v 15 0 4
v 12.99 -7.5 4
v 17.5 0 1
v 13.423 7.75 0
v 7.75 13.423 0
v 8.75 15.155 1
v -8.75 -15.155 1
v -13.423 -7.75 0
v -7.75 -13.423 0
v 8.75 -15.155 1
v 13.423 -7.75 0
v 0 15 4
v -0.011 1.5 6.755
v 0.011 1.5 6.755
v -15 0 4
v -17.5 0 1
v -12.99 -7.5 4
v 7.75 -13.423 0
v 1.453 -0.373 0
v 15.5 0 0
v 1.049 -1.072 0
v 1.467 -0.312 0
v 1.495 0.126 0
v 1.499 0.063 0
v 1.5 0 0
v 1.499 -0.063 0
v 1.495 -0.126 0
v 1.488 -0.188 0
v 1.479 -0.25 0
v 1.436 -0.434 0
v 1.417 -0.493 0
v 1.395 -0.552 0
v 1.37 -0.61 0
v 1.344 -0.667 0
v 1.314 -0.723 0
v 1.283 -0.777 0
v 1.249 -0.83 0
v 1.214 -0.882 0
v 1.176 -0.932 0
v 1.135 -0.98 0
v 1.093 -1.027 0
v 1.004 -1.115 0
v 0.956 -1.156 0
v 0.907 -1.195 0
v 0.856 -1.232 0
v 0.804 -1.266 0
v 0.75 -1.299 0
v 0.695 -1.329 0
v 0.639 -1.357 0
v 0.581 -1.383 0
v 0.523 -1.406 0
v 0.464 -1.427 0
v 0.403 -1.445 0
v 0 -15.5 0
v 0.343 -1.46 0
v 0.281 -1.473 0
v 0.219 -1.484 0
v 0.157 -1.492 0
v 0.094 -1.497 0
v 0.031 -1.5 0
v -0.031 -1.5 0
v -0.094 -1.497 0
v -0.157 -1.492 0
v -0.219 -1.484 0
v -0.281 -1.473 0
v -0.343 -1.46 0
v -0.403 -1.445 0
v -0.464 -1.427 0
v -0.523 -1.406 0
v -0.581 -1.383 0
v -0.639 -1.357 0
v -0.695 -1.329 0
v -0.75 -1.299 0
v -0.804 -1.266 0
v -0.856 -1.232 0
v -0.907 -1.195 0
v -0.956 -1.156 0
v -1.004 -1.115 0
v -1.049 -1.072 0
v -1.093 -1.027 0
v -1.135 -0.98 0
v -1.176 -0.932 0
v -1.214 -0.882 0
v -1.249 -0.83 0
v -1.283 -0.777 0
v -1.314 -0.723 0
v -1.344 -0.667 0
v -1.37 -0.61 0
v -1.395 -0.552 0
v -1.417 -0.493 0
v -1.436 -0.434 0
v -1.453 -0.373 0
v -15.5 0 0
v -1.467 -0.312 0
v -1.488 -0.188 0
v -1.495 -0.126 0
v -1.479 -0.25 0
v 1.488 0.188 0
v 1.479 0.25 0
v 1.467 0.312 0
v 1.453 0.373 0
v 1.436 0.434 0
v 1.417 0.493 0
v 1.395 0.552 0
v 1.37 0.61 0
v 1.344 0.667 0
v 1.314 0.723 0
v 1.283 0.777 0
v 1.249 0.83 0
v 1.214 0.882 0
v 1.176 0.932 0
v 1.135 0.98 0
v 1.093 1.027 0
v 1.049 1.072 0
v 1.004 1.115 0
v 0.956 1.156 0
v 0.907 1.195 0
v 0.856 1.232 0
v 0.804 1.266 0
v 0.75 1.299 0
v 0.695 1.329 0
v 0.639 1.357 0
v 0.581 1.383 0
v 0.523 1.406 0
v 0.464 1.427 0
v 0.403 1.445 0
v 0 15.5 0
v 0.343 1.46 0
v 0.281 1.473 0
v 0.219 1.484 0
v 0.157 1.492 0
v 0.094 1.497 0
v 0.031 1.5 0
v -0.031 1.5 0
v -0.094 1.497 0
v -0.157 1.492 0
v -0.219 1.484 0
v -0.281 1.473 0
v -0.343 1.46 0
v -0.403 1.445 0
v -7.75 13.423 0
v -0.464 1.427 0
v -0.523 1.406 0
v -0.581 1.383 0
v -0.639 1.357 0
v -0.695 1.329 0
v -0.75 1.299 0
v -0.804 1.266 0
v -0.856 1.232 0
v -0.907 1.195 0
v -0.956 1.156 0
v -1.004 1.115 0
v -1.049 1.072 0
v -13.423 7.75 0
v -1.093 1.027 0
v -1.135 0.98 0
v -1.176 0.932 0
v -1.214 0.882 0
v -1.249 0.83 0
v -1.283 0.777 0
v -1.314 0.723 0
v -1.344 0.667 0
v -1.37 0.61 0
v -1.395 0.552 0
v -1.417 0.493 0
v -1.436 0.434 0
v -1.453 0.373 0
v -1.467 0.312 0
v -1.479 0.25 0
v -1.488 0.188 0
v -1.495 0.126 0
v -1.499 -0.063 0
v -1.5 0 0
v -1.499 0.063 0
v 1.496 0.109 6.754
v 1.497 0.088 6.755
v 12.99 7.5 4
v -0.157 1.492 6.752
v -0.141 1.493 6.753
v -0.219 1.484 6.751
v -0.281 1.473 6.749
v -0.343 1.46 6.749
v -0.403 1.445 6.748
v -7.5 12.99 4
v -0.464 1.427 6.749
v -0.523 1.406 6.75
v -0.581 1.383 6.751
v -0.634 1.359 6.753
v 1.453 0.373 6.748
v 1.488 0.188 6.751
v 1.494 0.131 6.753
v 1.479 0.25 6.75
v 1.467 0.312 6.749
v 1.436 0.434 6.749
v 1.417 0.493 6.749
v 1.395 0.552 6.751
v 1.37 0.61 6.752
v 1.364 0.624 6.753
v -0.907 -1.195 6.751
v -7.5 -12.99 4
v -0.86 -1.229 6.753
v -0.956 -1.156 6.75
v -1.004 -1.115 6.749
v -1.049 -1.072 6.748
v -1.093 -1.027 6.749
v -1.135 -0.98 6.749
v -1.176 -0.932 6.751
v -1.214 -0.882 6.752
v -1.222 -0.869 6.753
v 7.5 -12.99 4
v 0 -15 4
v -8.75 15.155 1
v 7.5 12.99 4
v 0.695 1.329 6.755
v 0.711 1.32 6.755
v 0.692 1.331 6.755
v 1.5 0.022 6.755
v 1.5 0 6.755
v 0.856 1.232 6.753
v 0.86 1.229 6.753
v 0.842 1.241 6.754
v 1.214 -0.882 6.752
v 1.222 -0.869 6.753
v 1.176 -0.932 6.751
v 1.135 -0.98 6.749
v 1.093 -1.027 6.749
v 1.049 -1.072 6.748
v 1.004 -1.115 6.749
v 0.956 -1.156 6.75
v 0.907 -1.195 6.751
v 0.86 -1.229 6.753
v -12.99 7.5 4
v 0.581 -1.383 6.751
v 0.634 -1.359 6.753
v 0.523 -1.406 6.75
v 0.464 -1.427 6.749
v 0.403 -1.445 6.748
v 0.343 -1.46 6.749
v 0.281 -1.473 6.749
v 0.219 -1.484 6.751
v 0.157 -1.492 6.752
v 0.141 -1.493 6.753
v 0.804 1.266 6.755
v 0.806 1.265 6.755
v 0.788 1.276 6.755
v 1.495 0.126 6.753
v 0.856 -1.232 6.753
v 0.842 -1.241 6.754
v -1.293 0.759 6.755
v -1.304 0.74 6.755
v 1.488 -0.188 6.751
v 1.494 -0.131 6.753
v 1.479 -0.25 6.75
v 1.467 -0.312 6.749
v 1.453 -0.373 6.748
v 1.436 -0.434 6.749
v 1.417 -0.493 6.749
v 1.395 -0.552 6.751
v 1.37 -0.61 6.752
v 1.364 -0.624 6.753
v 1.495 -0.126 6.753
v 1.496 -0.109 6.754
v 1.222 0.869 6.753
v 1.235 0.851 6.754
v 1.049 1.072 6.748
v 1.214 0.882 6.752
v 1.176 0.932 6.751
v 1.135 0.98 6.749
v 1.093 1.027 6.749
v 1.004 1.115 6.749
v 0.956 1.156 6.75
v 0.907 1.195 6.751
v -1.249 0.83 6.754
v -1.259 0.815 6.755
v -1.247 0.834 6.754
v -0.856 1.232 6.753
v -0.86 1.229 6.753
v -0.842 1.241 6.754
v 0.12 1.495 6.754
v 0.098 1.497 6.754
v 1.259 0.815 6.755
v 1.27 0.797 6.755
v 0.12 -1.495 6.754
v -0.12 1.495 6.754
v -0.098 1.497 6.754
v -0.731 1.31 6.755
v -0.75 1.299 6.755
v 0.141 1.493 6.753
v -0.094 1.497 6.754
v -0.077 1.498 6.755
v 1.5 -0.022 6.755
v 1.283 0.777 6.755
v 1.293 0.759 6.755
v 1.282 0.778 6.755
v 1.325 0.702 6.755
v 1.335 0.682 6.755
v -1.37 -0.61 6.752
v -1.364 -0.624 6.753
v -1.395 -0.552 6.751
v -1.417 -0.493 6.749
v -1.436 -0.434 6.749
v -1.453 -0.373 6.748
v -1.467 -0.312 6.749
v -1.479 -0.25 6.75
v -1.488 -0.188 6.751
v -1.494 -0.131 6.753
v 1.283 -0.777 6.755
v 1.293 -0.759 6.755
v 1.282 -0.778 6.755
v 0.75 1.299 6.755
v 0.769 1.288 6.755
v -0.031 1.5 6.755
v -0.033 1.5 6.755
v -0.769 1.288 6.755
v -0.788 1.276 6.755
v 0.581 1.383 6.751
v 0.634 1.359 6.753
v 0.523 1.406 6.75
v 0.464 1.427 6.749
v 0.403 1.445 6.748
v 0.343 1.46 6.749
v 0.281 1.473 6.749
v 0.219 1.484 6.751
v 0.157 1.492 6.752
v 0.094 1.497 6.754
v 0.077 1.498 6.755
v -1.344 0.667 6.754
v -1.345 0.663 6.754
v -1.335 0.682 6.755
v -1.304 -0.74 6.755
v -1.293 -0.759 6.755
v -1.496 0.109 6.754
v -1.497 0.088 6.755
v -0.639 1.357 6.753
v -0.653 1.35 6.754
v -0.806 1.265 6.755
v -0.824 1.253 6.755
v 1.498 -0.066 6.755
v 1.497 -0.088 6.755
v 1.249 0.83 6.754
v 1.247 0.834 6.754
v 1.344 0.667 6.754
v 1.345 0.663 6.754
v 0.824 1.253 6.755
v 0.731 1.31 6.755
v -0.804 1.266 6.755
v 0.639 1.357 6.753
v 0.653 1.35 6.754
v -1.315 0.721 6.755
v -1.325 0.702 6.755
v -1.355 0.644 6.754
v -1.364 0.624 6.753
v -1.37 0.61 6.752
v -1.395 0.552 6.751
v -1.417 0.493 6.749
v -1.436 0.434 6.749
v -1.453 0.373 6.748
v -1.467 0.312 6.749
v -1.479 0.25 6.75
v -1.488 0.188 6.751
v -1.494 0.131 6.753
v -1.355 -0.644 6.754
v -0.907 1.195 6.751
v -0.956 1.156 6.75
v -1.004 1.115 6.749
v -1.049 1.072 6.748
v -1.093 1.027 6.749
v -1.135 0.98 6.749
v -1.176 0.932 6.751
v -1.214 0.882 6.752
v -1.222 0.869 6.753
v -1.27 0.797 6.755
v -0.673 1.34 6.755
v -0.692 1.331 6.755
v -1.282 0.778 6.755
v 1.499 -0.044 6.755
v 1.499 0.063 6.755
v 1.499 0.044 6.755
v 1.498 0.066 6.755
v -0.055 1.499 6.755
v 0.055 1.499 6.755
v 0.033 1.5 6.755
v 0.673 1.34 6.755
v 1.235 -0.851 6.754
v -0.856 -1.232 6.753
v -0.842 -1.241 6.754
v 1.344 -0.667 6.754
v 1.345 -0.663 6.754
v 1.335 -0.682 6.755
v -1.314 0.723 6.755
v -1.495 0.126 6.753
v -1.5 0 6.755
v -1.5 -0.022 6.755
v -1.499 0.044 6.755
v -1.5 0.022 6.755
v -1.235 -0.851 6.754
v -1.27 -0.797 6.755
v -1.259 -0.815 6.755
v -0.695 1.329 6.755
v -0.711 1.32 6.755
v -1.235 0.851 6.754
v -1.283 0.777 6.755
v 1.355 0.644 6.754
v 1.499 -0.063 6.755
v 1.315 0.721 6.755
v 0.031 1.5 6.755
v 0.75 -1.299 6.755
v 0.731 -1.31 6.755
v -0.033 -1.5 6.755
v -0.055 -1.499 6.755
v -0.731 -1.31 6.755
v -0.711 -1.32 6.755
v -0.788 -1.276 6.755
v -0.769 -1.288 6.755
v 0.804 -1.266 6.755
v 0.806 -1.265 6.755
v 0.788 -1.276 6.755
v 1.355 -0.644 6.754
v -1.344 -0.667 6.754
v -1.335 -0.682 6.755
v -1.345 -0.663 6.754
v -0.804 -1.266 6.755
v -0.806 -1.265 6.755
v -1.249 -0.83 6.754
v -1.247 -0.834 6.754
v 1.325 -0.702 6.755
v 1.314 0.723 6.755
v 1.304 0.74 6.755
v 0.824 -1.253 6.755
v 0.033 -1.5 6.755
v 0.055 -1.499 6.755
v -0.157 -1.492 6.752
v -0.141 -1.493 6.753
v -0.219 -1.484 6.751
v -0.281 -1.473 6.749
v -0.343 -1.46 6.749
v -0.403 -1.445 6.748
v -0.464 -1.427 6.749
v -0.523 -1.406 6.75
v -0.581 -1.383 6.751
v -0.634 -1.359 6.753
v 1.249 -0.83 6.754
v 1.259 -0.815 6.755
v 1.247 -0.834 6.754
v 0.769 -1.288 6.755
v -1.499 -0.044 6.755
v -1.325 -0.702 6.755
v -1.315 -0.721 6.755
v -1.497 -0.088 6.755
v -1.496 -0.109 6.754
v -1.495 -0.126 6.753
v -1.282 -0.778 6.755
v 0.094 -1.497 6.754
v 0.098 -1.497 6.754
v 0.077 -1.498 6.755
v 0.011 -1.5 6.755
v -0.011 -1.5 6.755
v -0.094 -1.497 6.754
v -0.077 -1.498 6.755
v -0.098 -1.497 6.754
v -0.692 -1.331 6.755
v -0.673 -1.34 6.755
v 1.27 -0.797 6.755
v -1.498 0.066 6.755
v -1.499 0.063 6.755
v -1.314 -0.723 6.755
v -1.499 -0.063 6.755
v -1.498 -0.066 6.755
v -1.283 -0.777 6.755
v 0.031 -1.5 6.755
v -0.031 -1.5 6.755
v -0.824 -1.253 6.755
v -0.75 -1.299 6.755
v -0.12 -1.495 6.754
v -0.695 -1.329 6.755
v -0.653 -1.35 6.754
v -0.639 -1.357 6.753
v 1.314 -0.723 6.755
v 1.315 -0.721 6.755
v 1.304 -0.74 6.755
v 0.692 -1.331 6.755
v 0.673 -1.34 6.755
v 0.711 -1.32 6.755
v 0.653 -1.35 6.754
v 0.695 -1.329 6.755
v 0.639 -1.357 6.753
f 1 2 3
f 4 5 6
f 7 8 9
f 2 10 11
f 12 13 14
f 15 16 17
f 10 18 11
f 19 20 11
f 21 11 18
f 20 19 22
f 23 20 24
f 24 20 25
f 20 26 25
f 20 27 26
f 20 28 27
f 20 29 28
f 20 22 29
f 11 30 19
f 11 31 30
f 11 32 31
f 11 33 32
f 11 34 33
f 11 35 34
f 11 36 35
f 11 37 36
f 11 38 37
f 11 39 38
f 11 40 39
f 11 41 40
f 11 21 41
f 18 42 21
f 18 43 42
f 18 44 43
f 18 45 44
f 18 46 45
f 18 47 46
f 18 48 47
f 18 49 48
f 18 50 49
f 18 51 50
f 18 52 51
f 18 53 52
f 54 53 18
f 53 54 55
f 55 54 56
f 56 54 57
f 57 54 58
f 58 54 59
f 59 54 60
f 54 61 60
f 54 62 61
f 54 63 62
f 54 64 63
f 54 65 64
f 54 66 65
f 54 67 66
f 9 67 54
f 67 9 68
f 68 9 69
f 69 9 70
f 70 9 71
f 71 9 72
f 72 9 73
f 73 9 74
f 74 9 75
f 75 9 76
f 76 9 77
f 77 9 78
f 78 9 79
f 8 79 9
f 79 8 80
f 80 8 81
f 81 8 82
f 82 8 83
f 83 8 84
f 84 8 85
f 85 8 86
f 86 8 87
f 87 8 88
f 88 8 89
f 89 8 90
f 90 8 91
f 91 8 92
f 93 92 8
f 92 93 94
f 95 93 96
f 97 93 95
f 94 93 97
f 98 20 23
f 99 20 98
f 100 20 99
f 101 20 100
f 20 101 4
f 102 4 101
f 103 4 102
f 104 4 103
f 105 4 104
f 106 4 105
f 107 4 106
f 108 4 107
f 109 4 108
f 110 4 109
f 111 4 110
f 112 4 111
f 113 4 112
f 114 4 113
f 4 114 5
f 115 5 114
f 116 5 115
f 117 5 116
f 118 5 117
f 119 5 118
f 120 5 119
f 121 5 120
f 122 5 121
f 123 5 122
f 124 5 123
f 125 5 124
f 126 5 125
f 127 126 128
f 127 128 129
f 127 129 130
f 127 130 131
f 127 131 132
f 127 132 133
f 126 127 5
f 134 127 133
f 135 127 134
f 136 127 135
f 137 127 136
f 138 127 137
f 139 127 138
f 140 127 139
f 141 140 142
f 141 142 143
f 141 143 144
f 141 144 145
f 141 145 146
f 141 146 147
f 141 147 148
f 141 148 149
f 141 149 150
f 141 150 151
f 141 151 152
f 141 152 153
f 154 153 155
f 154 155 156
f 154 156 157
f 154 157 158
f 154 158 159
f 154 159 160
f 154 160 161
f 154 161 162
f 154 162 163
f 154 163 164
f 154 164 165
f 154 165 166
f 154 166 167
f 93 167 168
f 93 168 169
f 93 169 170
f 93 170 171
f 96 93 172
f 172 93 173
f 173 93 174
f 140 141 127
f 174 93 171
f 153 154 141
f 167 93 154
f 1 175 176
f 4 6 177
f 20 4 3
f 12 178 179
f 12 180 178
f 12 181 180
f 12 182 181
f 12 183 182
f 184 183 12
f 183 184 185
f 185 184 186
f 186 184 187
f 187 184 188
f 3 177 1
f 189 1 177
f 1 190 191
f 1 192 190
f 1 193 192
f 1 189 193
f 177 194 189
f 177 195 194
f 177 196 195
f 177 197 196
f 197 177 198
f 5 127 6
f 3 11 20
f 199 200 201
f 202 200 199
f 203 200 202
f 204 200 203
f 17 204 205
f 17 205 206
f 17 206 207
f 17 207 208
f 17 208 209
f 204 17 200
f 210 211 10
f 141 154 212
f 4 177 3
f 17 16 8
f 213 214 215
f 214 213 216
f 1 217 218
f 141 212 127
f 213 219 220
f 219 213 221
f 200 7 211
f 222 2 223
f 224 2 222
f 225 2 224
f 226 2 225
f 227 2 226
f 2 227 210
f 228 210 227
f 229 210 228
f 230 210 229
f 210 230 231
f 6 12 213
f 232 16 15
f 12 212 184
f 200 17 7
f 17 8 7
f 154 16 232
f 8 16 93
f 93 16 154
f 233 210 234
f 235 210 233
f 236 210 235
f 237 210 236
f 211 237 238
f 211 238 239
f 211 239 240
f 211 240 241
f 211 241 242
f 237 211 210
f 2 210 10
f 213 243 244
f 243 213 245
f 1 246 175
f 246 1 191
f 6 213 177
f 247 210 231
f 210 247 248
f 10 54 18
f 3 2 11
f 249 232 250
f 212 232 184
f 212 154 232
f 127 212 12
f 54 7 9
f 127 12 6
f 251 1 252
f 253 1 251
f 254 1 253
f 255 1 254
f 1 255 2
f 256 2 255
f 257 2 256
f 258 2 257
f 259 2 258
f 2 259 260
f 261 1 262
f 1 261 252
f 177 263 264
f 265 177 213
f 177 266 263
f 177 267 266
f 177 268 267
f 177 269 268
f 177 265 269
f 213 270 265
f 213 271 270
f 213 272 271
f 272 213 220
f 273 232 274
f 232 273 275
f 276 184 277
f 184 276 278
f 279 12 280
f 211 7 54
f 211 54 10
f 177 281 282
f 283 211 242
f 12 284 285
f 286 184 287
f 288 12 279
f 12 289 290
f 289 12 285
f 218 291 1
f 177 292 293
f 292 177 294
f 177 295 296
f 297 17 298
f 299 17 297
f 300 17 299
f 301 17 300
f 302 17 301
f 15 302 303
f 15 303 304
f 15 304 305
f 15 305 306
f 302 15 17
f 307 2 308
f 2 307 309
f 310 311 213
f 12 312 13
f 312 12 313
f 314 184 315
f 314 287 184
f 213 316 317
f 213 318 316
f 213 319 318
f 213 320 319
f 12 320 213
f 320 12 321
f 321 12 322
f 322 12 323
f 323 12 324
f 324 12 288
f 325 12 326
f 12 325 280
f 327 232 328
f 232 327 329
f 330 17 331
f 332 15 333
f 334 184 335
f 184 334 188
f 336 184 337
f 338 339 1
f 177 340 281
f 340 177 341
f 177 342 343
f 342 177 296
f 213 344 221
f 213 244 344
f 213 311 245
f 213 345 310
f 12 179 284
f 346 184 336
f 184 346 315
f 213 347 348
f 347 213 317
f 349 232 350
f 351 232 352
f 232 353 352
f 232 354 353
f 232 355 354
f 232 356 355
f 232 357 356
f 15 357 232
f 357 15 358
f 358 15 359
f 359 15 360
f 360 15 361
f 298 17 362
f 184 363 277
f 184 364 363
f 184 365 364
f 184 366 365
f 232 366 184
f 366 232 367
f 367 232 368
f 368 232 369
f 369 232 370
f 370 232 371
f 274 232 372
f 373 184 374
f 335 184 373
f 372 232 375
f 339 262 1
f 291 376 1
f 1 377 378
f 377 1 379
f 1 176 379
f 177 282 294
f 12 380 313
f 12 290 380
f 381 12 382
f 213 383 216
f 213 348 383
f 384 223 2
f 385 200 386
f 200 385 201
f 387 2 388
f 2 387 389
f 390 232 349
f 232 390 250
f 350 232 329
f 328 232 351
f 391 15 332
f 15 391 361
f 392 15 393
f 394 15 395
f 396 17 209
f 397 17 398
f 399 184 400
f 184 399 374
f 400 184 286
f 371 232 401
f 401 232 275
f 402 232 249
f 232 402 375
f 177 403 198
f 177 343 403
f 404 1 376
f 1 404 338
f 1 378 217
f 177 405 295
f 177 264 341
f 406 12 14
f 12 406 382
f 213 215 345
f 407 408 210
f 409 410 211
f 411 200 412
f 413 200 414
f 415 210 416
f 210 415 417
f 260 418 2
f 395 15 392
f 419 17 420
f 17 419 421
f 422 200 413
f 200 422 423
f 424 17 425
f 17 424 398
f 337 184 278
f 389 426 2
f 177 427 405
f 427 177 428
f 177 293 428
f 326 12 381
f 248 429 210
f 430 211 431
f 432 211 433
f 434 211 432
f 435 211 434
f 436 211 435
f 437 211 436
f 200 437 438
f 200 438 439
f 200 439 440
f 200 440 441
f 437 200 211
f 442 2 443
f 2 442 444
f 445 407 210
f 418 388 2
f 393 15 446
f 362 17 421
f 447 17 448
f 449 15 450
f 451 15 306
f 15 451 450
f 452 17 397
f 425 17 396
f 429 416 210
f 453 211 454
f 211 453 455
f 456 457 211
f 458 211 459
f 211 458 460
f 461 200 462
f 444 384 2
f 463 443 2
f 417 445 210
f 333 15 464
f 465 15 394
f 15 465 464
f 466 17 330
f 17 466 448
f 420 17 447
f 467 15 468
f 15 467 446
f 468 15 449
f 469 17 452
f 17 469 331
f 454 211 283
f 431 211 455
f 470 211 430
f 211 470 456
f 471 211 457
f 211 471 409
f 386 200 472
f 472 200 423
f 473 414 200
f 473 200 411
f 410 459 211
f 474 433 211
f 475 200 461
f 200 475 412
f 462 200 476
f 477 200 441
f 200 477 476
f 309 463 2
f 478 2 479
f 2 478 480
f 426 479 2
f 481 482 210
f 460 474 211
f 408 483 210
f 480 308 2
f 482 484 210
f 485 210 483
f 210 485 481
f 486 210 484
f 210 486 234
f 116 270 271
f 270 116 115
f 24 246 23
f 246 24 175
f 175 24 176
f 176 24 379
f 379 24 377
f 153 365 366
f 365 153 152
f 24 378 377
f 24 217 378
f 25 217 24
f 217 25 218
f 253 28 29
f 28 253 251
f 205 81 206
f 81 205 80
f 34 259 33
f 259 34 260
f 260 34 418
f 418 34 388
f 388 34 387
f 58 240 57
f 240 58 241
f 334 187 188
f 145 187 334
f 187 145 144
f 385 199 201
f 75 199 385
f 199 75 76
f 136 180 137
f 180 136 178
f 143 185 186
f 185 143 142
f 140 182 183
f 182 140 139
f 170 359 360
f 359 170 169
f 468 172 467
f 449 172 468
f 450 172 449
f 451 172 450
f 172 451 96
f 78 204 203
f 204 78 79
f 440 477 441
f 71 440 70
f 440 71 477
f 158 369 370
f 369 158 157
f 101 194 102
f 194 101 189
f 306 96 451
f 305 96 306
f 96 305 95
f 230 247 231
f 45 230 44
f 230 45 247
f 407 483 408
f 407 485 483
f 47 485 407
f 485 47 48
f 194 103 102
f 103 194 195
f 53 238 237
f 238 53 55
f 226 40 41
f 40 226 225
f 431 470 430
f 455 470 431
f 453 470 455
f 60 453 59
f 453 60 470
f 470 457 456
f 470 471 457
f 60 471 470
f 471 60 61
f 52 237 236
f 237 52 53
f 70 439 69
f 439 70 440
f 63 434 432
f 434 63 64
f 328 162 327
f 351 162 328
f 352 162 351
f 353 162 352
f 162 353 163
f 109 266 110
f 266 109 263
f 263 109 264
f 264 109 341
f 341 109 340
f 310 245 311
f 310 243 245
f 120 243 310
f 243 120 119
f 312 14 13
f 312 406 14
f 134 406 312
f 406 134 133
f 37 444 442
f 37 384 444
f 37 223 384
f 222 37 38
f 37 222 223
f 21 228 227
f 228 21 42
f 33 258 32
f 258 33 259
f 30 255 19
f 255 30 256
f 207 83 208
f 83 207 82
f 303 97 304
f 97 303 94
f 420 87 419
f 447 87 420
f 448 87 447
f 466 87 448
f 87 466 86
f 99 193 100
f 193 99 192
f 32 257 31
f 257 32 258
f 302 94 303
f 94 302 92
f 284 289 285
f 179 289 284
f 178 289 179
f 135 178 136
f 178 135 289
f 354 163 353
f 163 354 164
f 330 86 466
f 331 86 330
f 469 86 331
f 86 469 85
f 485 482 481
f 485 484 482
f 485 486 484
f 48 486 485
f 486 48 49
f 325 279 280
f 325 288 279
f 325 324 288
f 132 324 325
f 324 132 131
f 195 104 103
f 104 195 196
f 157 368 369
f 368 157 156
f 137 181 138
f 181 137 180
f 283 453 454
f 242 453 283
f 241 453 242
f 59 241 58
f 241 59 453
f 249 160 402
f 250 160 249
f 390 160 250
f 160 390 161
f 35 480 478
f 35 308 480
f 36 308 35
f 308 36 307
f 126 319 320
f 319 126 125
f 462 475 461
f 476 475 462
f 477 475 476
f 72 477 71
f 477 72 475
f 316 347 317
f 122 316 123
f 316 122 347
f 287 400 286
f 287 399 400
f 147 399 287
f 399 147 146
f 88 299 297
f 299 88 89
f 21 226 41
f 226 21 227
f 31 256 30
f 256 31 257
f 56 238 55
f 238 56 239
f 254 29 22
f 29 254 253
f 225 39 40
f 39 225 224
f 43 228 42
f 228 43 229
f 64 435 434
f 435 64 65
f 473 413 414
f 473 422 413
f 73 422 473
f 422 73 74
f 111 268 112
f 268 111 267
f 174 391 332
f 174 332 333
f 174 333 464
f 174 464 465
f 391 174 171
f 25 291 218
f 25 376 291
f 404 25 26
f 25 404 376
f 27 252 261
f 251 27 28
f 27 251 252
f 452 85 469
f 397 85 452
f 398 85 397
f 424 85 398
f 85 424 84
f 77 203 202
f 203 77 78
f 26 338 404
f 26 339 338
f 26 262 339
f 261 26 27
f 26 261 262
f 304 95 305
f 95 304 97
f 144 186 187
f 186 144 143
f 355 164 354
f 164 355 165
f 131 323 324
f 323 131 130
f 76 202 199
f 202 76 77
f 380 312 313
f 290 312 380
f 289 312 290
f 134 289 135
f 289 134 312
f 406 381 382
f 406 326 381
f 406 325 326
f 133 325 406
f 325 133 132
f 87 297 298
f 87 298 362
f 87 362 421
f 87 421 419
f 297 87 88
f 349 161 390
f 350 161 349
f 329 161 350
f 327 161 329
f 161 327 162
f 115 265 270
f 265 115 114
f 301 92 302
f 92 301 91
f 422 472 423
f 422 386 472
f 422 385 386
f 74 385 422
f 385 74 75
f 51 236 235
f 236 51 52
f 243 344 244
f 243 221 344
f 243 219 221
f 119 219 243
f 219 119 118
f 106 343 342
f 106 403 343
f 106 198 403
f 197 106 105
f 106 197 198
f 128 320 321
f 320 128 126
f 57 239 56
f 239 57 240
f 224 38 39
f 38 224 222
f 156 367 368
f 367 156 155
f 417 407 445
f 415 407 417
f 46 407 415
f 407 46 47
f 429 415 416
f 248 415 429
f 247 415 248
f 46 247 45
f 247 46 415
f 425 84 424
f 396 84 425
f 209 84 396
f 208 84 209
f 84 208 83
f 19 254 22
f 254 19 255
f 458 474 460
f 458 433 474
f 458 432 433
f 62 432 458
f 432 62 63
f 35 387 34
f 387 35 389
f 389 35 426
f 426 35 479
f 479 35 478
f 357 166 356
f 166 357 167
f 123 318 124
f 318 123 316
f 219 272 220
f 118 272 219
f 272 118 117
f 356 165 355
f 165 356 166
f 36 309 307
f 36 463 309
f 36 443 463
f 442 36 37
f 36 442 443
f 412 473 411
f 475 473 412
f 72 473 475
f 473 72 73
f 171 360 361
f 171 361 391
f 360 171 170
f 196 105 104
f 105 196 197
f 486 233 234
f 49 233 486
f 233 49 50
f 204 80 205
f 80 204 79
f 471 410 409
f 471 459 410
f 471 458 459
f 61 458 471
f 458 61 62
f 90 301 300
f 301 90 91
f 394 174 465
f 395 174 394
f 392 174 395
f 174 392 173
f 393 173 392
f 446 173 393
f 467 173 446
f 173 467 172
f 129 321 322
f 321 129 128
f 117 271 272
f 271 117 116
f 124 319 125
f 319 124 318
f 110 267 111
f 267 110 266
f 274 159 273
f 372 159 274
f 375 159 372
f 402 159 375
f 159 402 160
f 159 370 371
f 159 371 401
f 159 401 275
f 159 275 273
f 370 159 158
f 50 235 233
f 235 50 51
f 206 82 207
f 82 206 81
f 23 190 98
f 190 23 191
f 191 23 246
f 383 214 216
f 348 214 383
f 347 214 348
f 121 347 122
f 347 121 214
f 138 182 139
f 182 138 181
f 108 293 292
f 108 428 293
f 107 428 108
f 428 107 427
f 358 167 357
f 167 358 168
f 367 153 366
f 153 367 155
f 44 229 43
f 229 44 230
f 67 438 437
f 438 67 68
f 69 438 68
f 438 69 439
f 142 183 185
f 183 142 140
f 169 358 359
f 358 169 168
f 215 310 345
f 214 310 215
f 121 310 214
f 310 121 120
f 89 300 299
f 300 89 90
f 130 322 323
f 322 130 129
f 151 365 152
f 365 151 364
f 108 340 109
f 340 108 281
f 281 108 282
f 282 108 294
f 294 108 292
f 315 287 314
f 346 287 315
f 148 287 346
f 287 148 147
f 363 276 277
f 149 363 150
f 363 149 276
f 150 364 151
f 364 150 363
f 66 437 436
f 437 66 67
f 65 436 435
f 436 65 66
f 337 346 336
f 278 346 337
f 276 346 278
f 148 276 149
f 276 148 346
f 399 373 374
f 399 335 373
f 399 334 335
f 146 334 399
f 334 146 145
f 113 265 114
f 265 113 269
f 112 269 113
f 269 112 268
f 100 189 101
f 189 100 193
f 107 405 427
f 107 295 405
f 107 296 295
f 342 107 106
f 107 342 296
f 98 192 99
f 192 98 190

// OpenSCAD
// file: roundedcube.scad
// Higher definition curves
$fs = 0.01;

module roundedcube(size = [1, 1, 1], center = false, radius = 0.5, apply_to = "all") {
	// If single value, convert to [x, y, z] vector
	size = (size[0] == undef) ? [size, size, size] : size;

	translate_min = radius;
	translate_xmax = size[0] - radius;
	translate_ymax = size[1] - radius;
	translate_zmax = size[2] - radius;

	diameter = radius * 2;

	module build_point(type = "sphere", rotate = [0, 0, 0]) {
		if (type == "sphere") {
			sphere(r = radius);
		} else if (type == "cylinder") {
			rotate(a = rotate)
			cylinder(h = diameter, r = radius, center = true);
		}
	}

	obj_translate = (center == false) ?
		[0, 0, 0] : [
			-(size[0] / 2),
			-(size[1] / 2),
			-(size[2] / 2)
		];

	translate(v = obj_translate) {
		hull() {
			for (translate_x = [translate_min, translate_xmax]) {
				x_at = (translate_x == translate_min) ? "min" : "max";
				for (translate_y = [translate_min, translate_ymax]) {
					y_at = (translate_y == translate_min) ? "min" : "max";
					for (translate_z = [translate_min, translate_zmax]) {
						z_at = (translate_z == translate_min) ? "min" : "max";

						translate(v = [translate_x, translate_y, translate_z])
						if (
							(apply_to == "all") ||
							(apply_to == "xmin" && x_at == "min") || (apply_to == "xmax" && x_at == "max") ||
							(apply_to == "ymin" && y_at == "min") || (apply_to == "ymax" && y_at == "max") ||
							(apply_to == "zmin" && z_at == "min") || (apply_to == "zmax" && z_at == "max")
						) {
							build_point("sphere");
						} else {
							rotate = 
								(apply_to == "xmin" || apply_to == "xmax" || apply_to == "x") ? [0, 90, 0] : (
								(apply_to == "ymin" || apply_to == "ymax" || apply_to == "y") ? [90, 90, 0] :
								[0, 0, 0]
							);
							build_point("cylinder", rotate);
						}
					}
				}
			}
		}
	}
}
// file: dimensions.scad
include<roundedcube.scad>

$fa = 2.0;
$fs = 0.1; // filament size / 2

$fn= $preview ? 32 : 150;

//VARIABLES
magnet_h = 20;
magnet_l = 60;
magnet_w = 5;

metal_bar_long_l = 68;
metal_bar_long_w = 2;
metal_bar_long_h = 10;

bolt_hole_r = 3 / 2;
bolt_hole_depth = 7;
bolt_hole_thickness = 2;

ribbon_opening_l = 58;
ribbon_opening_w = 18;

case_l = metal_bar_long_l;
case_w = 40;
case_h = 7;
case_floor_th = case_h - magnet_w;

magnet_cutout_w = magnet_w;
magnet_cutout_l = 1;

magnet_guard_th = 0.3;

aux_body_r = 12/2;
aux_th = 2;
aux_body_outer_r = aux_body_r + aux_th;

aux_body_h = 11;
aux_ring_h = 2;
aux_ring_r = 15;


aux_body_cutout = 11;


plate_th = 2.5;
plate_d = 95 ;
plate_offset_h = 2;
plate_offset_w = 2;


grille_th = plate_th;
grille_r = sqrt(3)/2 * (plate_d/2 -5);

mounting_hole_spacing = 10;
spacing = 0.01;
body_mounting_hole_offset = plate_offset_h;

inner_r = sqrt(3)/2*plate_d/2;
body_h = 30;



headband_mount_outer_d = 7;
headband_mount_inner_d = 5;
headband_mount_length_1 = 15; 

// <__________________________> //

module plate_base(){
rotate([0,0,90]) 
            linear_extrude(height = plate_th, center = true)
                circle(r = plate_d/2 - plate_offset_w);
}

module ribbon_opening (fillet = 1) {
    if (fillet == 0)
        cube([ribbon_opening_w, ribbon_opening_l, 10], center = true);
    
    else if (fillet == 1)
        roundedcube([ribbon_opening_w, ribbon_opening_l, 10], center = true, radius = 1, "all");
    
}

module ribbon_bolt_holes() {
    for (i = [-25 : 25 : 25], j = [-1 : 2 : 1])
            translate([j * case_w/2, i, 0]) bolt_hole();
}    

module ribbon_bolt_outer_shell() {
for (i = [-25 : 25 : 25], j = [-1 : 2 : 1])
                translate([j * case_w/2, i, 0]) bolt_outer();    
}


module mounting_holes() {
    for(i = [-3 : 3])
       rotate(i * 360/6)
            translate([0, plate_d/2 - mounting_hole_spacing, 0])
                bolt_hole();
}



module bolt_outer () {
    linear_extrude(height = bolt_hole_depth, center = true)
        circle(bolt_hole_r + bolt_hole_thickness);

}

module bolt_hole () {
    linear_extrude(height = bolt_hole_depth + spacing, center = true)
        circle(bolt_hole_r);

}
// main file
include <dimensions.scad>


//headband_mount_inner_d = 5;
plate_th = 4.5;
plate_d = 40;

bolt_d = 3;
nut_d = 4;


module tube_vise_plate (){
    linear_extrude(plate_th)
    circle(plate_d/2, $fn = 6);
}

module bolt_hole(diameter = 3) {
    translate([0, 0, -0.5])
    linear_extrude(plate_th + 10)
    circle(diameter/2);
}


module knob(){
    
    difference() {
        hull(){
            translate([0, 0, 4])
                sphere(d = 6);
            cylinder(h = 1, d1 = 31, d2 = 35,  $fn = 6);
            cylinder(h = 4, d1 = 31, d2 = 30,  $fn = 12);
        }
    bolt_hole(3);
    }
}

module copper_tube(){
    c_t_d = 5;
    c_t_l = 50;
    c_t_offset = 10;
    c_t_h = 10;
    rotate([90, 0, 0])
    for (i = [-1:2:1])
        translate([c_t_offset * i, plate_th, -c_t_l/2])
        cylinder(h = c_t_l, r = c_t_d/2);
}


module tube_vise (nut_or_bolt = 1) {

    diameter = (nut_or_bolt) ? nut_d:bolt_d;
    echo(diameter)
    difference(){
        tube_vise_plate();
        copper_tube();
        bolt_hole(diameter);
    }
}

knob();


module main () {
tube_vise(true);

translate([0, 0, 10])
rotate([180, 0, 0])
tube_vise(false);    
    
}
